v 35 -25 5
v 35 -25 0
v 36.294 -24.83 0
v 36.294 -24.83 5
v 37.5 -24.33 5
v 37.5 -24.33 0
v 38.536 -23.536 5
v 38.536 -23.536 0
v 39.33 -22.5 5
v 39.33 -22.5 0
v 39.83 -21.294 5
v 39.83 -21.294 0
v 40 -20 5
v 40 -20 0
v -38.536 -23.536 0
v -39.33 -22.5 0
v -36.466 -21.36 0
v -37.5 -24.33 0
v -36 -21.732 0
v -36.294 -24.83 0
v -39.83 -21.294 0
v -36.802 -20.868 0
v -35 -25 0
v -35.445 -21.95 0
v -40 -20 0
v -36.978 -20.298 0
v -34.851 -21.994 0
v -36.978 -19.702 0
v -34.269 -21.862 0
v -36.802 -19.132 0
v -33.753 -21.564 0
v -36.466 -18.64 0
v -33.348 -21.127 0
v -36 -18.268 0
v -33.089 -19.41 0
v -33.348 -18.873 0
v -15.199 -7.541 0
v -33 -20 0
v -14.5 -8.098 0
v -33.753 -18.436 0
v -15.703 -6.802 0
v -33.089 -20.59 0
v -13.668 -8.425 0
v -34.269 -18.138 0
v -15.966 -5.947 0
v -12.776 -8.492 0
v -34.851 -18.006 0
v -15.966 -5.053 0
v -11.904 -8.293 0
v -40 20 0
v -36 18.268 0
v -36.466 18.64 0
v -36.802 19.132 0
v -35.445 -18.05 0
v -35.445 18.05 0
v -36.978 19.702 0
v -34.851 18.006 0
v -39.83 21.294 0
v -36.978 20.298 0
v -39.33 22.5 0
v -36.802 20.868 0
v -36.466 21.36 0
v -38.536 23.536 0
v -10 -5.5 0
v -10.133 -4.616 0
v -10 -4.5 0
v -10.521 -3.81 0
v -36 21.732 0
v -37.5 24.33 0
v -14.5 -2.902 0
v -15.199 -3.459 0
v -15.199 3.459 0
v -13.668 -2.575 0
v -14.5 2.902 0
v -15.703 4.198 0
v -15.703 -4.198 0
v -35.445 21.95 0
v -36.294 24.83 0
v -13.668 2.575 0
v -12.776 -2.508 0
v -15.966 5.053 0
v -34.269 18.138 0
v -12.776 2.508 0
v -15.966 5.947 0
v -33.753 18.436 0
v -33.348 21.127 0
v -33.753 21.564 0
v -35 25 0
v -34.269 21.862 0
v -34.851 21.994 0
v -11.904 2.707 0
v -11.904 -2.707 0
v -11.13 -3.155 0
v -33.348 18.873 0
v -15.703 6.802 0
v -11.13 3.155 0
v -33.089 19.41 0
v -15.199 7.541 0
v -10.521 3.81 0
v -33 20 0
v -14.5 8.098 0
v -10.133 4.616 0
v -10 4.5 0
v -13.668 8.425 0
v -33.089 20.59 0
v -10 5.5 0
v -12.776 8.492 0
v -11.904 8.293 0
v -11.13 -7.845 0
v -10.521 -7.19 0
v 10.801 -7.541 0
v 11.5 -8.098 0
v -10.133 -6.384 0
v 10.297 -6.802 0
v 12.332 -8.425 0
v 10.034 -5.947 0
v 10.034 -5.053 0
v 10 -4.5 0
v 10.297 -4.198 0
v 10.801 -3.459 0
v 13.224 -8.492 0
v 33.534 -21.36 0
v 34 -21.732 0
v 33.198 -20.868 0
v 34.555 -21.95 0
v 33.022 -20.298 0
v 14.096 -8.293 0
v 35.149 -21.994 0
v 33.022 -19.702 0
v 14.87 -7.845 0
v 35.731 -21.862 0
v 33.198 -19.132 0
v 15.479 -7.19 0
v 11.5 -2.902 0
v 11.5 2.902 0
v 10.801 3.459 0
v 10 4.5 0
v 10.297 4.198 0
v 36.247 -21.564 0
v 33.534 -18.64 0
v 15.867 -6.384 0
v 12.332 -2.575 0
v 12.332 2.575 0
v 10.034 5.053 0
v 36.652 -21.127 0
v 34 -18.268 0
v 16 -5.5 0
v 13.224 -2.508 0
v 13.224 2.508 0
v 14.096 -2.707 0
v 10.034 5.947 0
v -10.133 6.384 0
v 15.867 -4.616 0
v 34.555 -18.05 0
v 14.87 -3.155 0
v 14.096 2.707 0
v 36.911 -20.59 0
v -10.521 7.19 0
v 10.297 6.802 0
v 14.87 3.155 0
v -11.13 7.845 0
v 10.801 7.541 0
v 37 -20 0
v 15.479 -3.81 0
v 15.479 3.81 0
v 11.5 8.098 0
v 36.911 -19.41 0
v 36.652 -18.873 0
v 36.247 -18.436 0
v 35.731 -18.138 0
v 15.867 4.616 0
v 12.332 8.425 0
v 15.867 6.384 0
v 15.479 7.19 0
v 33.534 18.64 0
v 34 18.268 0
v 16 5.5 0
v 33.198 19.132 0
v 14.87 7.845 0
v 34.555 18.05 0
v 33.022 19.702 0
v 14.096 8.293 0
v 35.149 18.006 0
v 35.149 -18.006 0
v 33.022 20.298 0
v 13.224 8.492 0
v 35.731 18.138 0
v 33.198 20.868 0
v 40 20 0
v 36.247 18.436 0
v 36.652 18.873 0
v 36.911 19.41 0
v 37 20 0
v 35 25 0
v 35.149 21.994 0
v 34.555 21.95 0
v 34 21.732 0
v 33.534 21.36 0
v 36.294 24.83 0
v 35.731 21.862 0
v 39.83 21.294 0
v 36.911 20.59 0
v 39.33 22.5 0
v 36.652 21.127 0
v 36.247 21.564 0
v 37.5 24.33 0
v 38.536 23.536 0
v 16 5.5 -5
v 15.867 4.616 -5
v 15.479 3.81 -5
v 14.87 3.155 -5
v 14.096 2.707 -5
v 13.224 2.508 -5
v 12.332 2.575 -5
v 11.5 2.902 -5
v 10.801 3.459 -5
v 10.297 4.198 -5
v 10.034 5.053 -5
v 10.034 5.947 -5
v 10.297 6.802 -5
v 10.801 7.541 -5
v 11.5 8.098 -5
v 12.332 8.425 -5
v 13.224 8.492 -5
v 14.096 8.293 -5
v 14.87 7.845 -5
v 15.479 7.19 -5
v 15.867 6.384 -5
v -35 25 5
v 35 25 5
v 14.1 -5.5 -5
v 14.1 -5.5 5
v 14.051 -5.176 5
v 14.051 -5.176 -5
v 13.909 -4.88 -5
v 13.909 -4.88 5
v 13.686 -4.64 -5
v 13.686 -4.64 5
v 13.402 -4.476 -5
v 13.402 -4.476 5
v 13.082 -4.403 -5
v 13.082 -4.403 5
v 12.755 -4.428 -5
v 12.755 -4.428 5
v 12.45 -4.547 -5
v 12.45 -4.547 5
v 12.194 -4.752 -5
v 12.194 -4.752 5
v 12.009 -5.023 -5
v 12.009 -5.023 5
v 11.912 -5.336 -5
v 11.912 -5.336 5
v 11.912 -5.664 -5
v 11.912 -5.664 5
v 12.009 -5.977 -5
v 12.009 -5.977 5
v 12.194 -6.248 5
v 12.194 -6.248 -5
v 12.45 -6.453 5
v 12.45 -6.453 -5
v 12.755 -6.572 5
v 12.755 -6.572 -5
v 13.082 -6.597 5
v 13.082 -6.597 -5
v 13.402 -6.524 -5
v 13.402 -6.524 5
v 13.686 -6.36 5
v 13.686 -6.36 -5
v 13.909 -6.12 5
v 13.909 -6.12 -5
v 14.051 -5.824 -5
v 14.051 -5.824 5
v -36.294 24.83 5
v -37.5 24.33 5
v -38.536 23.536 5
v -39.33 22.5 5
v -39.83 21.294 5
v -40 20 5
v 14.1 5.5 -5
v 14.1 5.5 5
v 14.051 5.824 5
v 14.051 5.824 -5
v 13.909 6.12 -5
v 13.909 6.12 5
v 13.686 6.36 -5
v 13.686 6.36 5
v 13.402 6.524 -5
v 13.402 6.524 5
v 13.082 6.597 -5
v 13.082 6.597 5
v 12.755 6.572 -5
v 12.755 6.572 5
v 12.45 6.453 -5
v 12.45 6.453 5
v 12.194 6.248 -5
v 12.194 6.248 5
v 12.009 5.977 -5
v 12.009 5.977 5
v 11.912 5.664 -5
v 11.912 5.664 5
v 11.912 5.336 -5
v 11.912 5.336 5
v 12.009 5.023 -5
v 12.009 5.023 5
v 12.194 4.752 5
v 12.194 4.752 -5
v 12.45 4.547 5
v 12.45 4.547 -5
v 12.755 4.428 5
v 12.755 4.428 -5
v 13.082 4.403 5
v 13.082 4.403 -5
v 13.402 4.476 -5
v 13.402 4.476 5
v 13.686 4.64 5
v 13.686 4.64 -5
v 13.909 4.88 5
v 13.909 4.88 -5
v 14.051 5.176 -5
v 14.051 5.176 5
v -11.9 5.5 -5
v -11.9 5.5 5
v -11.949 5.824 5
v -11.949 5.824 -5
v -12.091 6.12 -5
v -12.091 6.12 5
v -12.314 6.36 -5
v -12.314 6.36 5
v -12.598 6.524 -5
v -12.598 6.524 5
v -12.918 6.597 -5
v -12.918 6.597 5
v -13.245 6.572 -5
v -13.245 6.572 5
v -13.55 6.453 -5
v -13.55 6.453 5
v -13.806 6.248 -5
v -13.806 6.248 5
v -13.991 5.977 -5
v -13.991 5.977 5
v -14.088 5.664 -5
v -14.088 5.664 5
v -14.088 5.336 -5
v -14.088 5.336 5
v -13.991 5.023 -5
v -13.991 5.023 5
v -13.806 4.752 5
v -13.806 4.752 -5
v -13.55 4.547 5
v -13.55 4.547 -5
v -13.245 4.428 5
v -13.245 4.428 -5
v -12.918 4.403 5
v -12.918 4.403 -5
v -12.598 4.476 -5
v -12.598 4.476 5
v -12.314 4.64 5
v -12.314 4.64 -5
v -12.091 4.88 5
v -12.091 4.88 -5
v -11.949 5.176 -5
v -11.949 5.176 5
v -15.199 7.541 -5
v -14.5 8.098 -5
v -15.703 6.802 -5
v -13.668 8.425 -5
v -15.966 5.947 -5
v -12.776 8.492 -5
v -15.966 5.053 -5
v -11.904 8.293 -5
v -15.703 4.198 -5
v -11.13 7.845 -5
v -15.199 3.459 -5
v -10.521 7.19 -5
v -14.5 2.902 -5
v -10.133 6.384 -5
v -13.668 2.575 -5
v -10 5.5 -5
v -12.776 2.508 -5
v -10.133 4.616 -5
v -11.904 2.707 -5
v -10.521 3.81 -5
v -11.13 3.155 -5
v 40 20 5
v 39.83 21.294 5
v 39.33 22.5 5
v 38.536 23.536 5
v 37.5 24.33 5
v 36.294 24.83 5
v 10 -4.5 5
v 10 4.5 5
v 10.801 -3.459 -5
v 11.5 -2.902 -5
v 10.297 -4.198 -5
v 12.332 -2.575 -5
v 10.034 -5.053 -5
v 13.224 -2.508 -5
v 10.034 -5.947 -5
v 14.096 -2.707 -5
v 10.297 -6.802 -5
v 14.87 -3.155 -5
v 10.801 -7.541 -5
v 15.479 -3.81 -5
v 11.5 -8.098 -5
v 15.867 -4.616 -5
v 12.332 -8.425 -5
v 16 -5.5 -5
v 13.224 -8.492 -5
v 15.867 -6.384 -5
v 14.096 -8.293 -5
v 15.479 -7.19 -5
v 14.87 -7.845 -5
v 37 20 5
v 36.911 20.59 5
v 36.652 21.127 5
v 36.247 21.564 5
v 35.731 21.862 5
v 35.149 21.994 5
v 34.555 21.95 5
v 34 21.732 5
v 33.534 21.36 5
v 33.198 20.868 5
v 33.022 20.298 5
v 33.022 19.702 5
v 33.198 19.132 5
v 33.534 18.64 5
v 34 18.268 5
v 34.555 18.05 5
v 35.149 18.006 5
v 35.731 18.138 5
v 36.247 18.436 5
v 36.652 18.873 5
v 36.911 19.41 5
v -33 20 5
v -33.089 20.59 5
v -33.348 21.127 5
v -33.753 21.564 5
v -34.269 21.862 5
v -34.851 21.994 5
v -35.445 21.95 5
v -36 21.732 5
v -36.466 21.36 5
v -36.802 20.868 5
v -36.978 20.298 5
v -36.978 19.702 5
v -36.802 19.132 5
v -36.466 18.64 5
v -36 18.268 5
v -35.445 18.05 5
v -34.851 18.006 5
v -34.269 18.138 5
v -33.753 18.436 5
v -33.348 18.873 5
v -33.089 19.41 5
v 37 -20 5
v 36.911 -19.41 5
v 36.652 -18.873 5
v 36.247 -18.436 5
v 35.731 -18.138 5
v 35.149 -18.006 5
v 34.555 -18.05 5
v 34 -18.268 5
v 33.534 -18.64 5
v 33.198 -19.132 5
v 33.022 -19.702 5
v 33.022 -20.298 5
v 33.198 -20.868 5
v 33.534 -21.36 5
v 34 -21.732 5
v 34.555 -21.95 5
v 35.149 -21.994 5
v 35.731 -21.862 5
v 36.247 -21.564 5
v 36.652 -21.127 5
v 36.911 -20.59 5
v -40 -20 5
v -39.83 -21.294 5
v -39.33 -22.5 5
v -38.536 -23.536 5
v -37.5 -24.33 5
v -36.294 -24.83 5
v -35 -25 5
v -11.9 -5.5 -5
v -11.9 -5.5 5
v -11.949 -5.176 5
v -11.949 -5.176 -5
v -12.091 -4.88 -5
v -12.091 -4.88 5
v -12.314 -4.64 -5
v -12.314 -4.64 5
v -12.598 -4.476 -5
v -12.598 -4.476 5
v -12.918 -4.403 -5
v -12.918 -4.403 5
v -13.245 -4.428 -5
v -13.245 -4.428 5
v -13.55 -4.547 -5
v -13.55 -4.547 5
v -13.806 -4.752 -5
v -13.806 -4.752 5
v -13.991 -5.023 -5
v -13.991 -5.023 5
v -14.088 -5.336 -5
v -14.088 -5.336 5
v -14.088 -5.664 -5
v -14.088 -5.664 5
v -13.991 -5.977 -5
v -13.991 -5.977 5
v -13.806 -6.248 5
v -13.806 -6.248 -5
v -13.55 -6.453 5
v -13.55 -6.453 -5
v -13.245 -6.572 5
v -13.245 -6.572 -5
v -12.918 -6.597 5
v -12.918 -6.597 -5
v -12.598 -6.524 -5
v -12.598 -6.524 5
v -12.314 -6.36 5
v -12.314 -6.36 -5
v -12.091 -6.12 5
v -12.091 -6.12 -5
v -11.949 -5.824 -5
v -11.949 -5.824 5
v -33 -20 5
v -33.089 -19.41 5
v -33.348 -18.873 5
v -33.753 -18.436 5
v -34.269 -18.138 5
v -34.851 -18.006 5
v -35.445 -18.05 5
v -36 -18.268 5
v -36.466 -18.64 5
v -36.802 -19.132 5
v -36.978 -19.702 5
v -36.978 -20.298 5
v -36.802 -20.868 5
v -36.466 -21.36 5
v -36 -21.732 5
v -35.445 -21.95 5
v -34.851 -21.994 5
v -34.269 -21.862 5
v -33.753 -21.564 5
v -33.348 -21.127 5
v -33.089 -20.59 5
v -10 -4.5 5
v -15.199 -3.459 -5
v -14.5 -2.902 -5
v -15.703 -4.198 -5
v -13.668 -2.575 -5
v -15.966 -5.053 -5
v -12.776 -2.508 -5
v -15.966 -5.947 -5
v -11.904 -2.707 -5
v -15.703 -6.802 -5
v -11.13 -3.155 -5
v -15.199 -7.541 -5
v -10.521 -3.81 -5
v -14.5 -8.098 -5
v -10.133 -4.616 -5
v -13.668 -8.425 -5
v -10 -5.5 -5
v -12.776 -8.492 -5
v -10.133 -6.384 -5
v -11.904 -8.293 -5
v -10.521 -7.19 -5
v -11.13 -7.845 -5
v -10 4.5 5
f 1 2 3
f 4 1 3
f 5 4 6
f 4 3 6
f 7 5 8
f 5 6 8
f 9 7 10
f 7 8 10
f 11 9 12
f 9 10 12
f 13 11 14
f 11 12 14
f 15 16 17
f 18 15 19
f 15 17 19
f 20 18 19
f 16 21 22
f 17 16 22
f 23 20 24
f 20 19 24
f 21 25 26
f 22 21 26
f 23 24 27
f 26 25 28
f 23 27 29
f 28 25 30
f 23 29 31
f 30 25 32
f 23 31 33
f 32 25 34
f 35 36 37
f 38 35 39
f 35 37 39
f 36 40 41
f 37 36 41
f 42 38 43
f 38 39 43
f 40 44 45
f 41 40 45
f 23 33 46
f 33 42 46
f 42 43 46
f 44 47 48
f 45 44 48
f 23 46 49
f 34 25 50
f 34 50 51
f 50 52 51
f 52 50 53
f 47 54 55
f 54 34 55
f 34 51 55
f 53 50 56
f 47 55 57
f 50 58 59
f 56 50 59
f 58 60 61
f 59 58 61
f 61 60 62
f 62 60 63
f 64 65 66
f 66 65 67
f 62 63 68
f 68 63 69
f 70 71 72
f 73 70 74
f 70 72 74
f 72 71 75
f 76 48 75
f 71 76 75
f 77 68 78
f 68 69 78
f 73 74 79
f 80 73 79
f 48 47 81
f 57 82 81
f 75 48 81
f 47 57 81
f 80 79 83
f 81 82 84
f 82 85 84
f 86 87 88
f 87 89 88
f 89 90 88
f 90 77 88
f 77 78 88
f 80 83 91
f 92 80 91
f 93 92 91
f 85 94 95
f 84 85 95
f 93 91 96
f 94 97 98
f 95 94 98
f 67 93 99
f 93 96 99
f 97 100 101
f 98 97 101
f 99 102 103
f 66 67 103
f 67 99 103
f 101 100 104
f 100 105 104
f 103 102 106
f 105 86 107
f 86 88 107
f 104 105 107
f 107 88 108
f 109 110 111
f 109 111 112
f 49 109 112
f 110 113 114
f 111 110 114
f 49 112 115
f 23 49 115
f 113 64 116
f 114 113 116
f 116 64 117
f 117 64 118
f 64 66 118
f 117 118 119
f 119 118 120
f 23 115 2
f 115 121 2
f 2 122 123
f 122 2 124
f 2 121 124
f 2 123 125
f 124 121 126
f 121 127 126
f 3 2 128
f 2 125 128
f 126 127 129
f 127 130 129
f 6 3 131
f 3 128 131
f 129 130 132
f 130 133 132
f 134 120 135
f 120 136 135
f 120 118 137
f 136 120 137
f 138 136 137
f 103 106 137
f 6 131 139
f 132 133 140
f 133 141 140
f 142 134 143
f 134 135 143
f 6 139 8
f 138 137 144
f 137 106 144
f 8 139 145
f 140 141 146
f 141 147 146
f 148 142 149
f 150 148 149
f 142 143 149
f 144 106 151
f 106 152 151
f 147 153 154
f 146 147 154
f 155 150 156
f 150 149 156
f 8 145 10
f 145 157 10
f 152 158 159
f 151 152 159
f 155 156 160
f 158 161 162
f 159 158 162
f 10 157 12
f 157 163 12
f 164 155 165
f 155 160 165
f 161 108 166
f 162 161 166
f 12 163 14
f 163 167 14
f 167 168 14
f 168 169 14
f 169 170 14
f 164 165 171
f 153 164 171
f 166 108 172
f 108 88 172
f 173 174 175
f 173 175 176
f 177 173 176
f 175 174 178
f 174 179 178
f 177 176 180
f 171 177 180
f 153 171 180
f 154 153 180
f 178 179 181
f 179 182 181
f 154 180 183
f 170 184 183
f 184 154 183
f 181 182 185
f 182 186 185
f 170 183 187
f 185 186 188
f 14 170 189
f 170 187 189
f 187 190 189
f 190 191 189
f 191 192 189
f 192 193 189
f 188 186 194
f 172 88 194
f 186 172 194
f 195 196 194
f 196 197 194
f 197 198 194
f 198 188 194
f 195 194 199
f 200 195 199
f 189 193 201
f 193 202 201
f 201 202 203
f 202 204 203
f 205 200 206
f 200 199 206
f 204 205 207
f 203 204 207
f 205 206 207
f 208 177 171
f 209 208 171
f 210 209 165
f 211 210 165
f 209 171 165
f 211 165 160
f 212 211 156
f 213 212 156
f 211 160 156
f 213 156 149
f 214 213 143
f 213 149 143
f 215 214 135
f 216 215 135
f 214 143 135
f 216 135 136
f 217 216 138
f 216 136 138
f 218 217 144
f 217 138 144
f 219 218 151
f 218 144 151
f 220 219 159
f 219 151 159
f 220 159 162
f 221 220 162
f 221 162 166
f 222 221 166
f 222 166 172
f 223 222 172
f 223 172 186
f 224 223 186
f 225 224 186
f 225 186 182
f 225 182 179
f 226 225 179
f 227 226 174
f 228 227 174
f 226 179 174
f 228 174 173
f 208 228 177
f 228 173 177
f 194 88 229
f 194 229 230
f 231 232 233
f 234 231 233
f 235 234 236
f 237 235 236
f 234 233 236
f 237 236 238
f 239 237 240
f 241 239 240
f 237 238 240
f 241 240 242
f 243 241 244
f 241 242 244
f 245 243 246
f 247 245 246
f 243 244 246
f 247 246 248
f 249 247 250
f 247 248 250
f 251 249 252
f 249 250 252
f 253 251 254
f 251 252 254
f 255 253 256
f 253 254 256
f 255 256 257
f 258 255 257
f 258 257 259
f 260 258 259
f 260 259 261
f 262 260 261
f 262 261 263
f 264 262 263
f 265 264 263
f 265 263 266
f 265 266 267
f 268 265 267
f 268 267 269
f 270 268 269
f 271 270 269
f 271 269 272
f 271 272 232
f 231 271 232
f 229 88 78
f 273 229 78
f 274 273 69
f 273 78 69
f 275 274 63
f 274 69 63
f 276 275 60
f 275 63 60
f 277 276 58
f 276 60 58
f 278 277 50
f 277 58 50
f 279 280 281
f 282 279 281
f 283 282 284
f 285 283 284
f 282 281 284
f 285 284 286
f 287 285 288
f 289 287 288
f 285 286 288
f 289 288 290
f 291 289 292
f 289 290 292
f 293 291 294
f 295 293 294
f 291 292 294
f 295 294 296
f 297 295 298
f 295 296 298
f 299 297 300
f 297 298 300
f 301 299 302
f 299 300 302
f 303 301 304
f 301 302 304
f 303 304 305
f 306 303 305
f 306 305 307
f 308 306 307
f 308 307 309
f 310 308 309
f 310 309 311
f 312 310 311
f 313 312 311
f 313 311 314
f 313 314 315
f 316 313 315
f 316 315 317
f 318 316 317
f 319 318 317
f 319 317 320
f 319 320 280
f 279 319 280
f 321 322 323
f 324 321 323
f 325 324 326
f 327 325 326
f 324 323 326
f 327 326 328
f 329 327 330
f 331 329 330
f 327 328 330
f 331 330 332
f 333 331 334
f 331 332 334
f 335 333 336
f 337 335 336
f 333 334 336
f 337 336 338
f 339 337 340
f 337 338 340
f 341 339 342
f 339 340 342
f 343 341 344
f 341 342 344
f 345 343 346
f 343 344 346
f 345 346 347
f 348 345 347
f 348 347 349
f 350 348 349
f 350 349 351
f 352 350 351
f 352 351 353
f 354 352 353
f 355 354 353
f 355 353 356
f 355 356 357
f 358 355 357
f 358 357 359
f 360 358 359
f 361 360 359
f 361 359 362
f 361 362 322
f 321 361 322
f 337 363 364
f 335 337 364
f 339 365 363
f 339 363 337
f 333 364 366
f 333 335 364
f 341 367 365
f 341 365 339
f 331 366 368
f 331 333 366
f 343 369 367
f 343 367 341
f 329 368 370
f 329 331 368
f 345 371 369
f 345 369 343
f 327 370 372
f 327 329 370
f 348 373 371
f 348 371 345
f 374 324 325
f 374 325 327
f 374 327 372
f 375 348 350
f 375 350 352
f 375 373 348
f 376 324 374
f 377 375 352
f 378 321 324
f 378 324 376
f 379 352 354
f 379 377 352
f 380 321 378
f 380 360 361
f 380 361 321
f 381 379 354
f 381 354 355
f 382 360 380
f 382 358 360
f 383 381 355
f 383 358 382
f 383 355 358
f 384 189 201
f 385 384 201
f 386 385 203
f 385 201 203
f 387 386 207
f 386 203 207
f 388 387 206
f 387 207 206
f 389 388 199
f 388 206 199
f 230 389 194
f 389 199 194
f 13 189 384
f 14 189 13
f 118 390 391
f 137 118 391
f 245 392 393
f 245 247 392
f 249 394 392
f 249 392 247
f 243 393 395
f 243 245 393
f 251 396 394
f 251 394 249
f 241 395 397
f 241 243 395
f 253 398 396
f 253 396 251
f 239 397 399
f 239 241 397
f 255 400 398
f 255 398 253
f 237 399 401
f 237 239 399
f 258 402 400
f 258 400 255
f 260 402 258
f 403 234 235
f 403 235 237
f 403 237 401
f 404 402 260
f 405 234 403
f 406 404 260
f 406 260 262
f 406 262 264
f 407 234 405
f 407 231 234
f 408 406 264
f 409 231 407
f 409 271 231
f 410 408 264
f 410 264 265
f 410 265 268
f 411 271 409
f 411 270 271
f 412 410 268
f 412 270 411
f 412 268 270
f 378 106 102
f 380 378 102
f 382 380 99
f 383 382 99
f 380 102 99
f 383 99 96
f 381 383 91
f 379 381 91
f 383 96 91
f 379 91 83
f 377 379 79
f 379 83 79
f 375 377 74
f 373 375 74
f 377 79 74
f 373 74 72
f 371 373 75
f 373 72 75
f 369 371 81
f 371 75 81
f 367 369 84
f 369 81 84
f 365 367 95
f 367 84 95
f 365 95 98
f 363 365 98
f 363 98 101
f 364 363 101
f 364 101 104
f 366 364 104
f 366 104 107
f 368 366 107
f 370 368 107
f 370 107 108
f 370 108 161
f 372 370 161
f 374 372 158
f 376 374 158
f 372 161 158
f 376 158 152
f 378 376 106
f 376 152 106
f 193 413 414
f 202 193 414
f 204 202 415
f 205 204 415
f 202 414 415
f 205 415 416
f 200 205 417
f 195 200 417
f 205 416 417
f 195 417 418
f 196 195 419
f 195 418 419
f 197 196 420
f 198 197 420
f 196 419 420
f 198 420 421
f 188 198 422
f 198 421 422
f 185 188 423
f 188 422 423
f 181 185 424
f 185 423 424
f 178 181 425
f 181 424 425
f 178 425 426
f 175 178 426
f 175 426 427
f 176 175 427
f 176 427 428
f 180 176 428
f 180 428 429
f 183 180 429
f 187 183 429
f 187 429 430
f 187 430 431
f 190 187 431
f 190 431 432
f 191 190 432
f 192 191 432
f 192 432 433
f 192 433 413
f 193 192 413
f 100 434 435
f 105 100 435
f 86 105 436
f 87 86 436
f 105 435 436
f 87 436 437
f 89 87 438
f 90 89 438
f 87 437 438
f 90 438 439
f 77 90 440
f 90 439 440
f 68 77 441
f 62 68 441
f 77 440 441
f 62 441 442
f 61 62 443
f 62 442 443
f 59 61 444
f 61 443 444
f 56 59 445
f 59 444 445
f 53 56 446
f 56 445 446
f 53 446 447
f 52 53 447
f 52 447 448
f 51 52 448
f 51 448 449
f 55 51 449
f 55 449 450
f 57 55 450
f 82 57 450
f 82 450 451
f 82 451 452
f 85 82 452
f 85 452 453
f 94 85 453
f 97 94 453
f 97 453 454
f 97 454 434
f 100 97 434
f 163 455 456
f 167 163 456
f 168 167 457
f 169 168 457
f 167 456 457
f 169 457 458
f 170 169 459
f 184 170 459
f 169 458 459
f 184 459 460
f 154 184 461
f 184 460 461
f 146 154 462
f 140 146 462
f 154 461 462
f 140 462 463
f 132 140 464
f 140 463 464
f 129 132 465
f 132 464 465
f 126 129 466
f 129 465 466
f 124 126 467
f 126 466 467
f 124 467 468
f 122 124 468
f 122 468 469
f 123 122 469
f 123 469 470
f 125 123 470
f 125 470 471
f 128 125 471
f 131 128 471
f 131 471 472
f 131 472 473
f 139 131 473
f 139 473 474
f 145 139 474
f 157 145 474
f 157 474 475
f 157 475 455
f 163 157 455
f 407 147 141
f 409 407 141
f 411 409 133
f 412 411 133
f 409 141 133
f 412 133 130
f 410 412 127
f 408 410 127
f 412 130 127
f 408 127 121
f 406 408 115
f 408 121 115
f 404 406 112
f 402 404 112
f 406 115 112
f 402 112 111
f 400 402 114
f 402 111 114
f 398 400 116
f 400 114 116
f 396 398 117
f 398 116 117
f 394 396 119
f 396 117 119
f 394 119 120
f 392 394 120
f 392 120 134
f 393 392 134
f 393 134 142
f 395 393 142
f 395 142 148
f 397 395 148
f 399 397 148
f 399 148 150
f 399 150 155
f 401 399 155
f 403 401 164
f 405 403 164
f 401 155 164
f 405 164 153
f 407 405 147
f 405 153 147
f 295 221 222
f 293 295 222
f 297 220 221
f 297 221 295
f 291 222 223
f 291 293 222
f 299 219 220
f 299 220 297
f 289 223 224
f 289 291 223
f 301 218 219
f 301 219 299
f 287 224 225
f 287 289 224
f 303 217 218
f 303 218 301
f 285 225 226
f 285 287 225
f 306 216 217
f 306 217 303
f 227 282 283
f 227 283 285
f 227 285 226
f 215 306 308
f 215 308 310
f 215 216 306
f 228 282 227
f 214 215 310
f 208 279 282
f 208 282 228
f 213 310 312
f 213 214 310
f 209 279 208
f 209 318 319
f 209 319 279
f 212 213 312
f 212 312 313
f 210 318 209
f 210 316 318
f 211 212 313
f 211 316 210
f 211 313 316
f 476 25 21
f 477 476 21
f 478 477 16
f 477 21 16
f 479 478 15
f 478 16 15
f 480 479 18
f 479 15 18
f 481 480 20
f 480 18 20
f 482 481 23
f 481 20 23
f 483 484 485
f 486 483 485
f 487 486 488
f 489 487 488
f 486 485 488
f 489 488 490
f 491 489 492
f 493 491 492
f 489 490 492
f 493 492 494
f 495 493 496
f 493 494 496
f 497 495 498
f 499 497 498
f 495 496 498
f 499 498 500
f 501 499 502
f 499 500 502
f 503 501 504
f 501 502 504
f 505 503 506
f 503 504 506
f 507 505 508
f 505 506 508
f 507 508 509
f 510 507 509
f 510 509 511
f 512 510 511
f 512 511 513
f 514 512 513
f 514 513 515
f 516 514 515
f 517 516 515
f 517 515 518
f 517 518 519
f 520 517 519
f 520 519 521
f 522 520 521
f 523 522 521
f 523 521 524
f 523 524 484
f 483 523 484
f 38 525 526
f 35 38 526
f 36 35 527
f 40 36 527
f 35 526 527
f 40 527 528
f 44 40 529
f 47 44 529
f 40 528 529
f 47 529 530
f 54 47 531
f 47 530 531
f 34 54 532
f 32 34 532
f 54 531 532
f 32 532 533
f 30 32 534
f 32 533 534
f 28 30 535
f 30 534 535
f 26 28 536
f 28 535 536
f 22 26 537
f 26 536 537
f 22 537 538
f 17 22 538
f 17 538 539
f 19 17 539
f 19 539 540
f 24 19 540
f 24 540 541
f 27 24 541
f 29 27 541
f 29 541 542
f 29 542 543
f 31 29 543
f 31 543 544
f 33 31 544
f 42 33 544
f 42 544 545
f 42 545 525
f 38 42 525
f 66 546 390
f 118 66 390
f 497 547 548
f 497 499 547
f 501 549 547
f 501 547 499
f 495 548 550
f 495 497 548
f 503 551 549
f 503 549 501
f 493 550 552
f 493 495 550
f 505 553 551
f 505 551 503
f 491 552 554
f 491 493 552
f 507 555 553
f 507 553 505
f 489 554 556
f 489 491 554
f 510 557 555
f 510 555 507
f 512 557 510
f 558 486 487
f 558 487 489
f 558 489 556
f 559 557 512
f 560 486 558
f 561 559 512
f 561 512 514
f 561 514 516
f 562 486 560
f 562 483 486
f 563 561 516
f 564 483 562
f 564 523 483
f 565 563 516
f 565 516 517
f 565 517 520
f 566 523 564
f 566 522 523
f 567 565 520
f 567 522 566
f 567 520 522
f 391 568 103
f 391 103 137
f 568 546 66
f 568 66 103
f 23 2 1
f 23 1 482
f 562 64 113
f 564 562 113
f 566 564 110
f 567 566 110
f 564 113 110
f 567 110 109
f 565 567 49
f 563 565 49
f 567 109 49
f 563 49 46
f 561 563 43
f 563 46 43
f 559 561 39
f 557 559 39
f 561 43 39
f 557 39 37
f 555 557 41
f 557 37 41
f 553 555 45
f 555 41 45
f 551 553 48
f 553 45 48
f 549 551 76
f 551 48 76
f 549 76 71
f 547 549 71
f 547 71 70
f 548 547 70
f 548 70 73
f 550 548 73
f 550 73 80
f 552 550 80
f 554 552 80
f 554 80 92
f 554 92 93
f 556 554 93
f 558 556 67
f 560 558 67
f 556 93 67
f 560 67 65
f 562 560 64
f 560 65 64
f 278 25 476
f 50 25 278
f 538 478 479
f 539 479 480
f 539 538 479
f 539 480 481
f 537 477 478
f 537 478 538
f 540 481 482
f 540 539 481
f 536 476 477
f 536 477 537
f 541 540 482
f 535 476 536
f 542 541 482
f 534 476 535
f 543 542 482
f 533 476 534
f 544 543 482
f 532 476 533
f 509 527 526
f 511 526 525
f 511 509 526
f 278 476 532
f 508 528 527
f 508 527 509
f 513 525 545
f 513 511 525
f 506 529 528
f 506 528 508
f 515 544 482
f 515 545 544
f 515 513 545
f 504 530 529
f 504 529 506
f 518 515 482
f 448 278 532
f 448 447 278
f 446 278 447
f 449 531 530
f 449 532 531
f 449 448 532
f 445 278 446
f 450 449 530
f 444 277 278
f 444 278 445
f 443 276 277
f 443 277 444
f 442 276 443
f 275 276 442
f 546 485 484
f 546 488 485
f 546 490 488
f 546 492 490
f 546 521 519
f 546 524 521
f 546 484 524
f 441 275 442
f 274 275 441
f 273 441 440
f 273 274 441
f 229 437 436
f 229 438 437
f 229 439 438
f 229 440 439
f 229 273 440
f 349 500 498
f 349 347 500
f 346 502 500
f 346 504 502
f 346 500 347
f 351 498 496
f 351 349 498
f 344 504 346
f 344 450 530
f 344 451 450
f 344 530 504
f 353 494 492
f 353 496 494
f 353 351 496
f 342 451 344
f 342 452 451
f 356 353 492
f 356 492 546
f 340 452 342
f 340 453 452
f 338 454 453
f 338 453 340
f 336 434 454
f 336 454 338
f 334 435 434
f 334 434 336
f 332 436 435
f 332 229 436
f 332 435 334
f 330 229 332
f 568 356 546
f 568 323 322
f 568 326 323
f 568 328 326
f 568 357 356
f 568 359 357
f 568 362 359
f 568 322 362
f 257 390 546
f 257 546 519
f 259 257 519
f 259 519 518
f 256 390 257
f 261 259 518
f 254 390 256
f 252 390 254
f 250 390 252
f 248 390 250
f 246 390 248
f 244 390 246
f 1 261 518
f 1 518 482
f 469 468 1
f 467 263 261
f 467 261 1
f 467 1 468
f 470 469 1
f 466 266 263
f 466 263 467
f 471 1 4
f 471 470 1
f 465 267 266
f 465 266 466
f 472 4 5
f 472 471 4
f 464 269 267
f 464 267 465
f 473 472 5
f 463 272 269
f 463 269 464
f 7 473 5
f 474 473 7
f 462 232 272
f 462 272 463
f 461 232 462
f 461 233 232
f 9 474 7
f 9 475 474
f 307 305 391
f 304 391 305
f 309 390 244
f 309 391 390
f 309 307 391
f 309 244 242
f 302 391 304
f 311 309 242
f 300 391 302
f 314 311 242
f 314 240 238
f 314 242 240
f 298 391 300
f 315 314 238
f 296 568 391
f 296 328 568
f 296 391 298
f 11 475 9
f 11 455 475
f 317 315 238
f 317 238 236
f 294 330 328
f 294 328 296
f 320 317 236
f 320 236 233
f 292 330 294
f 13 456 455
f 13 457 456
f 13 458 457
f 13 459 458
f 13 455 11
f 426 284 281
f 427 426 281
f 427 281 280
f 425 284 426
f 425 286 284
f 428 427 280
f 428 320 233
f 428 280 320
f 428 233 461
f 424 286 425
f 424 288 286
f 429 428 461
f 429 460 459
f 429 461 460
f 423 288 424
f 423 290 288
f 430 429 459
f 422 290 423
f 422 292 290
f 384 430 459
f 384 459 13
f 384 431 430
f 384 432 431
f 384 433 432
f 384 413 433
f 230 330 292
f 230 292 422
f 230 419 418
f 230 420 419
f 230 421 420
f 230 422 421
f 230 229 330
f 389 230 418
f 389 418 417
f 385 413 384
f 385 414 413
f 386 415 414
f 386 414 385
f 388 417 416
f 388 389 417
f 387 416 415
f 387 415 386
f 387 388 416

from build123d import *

# Parameters (mm, degrees)
PAD001_DEPTH    = 5
SKETCH006_R     = 2
POCKET003_DEPTH = 20
SKETCH008_R     = 3
PAD002_DEPTH    = 5
SKETCH007_R     = 1.1
SKETCH007_W     = 20
SKETCH007_H     = 9
POCKET004_DEPTH = 20


with BuildPart() as part:
    # Sketch005 → Pad001 (new body)
    with BuildSketch(Plane.XY):
        with BuildLine():
            ThreePointArc((-35, 25), (-38.535534, 23.535534), (-40, 20))
            Line((-40, -20), (-40, 20))
            ThreePointArc((-40, -20), (-38.535534, -23.535534), (-35, -25))
            Line((35, -25), (-35, -25))
            ThreePointArc((35, -25), (38.535534, -23.535534), (40, -20))
            Line((40, 20), (40, -20))
            ThreePointArc((40, 20), (38.535534, 23.535534), (35, 25))
            Line((-35, 25), (35, 25))
        make_face()
    extrude(amount=PAD001_DEPTH)

    # Sketch006 (on Face10 of Pad001) → Pocket003 (cut)
    with BuildSketch(Plane.XY.offset(5)):
        with Locations((-35, 20)):
            Circle(SKETCH006_R)
        with Locations((35, 20)):
            Circle(SKETCH006_R)
        with Locations((35, -20)):
            Circle(SKETCH006_R)
        with Locations((-35, -20)):
            Circle(SKETCH006_R)
    extrude(amount=-POCKET003_DEPTH, mode=Mode.SUBTRACT)

    # Sketch008 → Pad002 (join)
    with BuildSketch(Plane(origin=(0, 0, 0), x_dir=(1, 0, 0), z_dir=(0, 0, -1))):
        with Locations((-13, 5.5)):
            Circle(SKETCH008_R)
        with Locations((13, 5.5)):
            Circle(SKETCH008_R)
        with Locations((13, -5.5)):
            Circle(SKETCH008_R)
        with Locations((-13, -5.5)):
            Circle(SKETCH008_R)
    extrude(amount=PAD002_DEPTH)

    # Sketch007 (on Face5 of Pocket003) → Pocket004 (cut)
    with BuildSketch(Plane.XY.offset(5)):
        with Locations((-13, 5.5)):
            Circle(SKETCH007_R)
        with Locations((13, 5.5)):
            Circle(SKETCH007_R)
        with Locations((13, -5.5)):
            Circle(SKETCH007_R)
        with Locations((-13, -5.5)):
            Circle(SKETCH007_R)
        Rectangle(SKETCH007_W, SKETCH007_H)
    extrude(amount=-POCKET004_DEPTH, mode=Mode.SUBTRACT)


solid = part.part
